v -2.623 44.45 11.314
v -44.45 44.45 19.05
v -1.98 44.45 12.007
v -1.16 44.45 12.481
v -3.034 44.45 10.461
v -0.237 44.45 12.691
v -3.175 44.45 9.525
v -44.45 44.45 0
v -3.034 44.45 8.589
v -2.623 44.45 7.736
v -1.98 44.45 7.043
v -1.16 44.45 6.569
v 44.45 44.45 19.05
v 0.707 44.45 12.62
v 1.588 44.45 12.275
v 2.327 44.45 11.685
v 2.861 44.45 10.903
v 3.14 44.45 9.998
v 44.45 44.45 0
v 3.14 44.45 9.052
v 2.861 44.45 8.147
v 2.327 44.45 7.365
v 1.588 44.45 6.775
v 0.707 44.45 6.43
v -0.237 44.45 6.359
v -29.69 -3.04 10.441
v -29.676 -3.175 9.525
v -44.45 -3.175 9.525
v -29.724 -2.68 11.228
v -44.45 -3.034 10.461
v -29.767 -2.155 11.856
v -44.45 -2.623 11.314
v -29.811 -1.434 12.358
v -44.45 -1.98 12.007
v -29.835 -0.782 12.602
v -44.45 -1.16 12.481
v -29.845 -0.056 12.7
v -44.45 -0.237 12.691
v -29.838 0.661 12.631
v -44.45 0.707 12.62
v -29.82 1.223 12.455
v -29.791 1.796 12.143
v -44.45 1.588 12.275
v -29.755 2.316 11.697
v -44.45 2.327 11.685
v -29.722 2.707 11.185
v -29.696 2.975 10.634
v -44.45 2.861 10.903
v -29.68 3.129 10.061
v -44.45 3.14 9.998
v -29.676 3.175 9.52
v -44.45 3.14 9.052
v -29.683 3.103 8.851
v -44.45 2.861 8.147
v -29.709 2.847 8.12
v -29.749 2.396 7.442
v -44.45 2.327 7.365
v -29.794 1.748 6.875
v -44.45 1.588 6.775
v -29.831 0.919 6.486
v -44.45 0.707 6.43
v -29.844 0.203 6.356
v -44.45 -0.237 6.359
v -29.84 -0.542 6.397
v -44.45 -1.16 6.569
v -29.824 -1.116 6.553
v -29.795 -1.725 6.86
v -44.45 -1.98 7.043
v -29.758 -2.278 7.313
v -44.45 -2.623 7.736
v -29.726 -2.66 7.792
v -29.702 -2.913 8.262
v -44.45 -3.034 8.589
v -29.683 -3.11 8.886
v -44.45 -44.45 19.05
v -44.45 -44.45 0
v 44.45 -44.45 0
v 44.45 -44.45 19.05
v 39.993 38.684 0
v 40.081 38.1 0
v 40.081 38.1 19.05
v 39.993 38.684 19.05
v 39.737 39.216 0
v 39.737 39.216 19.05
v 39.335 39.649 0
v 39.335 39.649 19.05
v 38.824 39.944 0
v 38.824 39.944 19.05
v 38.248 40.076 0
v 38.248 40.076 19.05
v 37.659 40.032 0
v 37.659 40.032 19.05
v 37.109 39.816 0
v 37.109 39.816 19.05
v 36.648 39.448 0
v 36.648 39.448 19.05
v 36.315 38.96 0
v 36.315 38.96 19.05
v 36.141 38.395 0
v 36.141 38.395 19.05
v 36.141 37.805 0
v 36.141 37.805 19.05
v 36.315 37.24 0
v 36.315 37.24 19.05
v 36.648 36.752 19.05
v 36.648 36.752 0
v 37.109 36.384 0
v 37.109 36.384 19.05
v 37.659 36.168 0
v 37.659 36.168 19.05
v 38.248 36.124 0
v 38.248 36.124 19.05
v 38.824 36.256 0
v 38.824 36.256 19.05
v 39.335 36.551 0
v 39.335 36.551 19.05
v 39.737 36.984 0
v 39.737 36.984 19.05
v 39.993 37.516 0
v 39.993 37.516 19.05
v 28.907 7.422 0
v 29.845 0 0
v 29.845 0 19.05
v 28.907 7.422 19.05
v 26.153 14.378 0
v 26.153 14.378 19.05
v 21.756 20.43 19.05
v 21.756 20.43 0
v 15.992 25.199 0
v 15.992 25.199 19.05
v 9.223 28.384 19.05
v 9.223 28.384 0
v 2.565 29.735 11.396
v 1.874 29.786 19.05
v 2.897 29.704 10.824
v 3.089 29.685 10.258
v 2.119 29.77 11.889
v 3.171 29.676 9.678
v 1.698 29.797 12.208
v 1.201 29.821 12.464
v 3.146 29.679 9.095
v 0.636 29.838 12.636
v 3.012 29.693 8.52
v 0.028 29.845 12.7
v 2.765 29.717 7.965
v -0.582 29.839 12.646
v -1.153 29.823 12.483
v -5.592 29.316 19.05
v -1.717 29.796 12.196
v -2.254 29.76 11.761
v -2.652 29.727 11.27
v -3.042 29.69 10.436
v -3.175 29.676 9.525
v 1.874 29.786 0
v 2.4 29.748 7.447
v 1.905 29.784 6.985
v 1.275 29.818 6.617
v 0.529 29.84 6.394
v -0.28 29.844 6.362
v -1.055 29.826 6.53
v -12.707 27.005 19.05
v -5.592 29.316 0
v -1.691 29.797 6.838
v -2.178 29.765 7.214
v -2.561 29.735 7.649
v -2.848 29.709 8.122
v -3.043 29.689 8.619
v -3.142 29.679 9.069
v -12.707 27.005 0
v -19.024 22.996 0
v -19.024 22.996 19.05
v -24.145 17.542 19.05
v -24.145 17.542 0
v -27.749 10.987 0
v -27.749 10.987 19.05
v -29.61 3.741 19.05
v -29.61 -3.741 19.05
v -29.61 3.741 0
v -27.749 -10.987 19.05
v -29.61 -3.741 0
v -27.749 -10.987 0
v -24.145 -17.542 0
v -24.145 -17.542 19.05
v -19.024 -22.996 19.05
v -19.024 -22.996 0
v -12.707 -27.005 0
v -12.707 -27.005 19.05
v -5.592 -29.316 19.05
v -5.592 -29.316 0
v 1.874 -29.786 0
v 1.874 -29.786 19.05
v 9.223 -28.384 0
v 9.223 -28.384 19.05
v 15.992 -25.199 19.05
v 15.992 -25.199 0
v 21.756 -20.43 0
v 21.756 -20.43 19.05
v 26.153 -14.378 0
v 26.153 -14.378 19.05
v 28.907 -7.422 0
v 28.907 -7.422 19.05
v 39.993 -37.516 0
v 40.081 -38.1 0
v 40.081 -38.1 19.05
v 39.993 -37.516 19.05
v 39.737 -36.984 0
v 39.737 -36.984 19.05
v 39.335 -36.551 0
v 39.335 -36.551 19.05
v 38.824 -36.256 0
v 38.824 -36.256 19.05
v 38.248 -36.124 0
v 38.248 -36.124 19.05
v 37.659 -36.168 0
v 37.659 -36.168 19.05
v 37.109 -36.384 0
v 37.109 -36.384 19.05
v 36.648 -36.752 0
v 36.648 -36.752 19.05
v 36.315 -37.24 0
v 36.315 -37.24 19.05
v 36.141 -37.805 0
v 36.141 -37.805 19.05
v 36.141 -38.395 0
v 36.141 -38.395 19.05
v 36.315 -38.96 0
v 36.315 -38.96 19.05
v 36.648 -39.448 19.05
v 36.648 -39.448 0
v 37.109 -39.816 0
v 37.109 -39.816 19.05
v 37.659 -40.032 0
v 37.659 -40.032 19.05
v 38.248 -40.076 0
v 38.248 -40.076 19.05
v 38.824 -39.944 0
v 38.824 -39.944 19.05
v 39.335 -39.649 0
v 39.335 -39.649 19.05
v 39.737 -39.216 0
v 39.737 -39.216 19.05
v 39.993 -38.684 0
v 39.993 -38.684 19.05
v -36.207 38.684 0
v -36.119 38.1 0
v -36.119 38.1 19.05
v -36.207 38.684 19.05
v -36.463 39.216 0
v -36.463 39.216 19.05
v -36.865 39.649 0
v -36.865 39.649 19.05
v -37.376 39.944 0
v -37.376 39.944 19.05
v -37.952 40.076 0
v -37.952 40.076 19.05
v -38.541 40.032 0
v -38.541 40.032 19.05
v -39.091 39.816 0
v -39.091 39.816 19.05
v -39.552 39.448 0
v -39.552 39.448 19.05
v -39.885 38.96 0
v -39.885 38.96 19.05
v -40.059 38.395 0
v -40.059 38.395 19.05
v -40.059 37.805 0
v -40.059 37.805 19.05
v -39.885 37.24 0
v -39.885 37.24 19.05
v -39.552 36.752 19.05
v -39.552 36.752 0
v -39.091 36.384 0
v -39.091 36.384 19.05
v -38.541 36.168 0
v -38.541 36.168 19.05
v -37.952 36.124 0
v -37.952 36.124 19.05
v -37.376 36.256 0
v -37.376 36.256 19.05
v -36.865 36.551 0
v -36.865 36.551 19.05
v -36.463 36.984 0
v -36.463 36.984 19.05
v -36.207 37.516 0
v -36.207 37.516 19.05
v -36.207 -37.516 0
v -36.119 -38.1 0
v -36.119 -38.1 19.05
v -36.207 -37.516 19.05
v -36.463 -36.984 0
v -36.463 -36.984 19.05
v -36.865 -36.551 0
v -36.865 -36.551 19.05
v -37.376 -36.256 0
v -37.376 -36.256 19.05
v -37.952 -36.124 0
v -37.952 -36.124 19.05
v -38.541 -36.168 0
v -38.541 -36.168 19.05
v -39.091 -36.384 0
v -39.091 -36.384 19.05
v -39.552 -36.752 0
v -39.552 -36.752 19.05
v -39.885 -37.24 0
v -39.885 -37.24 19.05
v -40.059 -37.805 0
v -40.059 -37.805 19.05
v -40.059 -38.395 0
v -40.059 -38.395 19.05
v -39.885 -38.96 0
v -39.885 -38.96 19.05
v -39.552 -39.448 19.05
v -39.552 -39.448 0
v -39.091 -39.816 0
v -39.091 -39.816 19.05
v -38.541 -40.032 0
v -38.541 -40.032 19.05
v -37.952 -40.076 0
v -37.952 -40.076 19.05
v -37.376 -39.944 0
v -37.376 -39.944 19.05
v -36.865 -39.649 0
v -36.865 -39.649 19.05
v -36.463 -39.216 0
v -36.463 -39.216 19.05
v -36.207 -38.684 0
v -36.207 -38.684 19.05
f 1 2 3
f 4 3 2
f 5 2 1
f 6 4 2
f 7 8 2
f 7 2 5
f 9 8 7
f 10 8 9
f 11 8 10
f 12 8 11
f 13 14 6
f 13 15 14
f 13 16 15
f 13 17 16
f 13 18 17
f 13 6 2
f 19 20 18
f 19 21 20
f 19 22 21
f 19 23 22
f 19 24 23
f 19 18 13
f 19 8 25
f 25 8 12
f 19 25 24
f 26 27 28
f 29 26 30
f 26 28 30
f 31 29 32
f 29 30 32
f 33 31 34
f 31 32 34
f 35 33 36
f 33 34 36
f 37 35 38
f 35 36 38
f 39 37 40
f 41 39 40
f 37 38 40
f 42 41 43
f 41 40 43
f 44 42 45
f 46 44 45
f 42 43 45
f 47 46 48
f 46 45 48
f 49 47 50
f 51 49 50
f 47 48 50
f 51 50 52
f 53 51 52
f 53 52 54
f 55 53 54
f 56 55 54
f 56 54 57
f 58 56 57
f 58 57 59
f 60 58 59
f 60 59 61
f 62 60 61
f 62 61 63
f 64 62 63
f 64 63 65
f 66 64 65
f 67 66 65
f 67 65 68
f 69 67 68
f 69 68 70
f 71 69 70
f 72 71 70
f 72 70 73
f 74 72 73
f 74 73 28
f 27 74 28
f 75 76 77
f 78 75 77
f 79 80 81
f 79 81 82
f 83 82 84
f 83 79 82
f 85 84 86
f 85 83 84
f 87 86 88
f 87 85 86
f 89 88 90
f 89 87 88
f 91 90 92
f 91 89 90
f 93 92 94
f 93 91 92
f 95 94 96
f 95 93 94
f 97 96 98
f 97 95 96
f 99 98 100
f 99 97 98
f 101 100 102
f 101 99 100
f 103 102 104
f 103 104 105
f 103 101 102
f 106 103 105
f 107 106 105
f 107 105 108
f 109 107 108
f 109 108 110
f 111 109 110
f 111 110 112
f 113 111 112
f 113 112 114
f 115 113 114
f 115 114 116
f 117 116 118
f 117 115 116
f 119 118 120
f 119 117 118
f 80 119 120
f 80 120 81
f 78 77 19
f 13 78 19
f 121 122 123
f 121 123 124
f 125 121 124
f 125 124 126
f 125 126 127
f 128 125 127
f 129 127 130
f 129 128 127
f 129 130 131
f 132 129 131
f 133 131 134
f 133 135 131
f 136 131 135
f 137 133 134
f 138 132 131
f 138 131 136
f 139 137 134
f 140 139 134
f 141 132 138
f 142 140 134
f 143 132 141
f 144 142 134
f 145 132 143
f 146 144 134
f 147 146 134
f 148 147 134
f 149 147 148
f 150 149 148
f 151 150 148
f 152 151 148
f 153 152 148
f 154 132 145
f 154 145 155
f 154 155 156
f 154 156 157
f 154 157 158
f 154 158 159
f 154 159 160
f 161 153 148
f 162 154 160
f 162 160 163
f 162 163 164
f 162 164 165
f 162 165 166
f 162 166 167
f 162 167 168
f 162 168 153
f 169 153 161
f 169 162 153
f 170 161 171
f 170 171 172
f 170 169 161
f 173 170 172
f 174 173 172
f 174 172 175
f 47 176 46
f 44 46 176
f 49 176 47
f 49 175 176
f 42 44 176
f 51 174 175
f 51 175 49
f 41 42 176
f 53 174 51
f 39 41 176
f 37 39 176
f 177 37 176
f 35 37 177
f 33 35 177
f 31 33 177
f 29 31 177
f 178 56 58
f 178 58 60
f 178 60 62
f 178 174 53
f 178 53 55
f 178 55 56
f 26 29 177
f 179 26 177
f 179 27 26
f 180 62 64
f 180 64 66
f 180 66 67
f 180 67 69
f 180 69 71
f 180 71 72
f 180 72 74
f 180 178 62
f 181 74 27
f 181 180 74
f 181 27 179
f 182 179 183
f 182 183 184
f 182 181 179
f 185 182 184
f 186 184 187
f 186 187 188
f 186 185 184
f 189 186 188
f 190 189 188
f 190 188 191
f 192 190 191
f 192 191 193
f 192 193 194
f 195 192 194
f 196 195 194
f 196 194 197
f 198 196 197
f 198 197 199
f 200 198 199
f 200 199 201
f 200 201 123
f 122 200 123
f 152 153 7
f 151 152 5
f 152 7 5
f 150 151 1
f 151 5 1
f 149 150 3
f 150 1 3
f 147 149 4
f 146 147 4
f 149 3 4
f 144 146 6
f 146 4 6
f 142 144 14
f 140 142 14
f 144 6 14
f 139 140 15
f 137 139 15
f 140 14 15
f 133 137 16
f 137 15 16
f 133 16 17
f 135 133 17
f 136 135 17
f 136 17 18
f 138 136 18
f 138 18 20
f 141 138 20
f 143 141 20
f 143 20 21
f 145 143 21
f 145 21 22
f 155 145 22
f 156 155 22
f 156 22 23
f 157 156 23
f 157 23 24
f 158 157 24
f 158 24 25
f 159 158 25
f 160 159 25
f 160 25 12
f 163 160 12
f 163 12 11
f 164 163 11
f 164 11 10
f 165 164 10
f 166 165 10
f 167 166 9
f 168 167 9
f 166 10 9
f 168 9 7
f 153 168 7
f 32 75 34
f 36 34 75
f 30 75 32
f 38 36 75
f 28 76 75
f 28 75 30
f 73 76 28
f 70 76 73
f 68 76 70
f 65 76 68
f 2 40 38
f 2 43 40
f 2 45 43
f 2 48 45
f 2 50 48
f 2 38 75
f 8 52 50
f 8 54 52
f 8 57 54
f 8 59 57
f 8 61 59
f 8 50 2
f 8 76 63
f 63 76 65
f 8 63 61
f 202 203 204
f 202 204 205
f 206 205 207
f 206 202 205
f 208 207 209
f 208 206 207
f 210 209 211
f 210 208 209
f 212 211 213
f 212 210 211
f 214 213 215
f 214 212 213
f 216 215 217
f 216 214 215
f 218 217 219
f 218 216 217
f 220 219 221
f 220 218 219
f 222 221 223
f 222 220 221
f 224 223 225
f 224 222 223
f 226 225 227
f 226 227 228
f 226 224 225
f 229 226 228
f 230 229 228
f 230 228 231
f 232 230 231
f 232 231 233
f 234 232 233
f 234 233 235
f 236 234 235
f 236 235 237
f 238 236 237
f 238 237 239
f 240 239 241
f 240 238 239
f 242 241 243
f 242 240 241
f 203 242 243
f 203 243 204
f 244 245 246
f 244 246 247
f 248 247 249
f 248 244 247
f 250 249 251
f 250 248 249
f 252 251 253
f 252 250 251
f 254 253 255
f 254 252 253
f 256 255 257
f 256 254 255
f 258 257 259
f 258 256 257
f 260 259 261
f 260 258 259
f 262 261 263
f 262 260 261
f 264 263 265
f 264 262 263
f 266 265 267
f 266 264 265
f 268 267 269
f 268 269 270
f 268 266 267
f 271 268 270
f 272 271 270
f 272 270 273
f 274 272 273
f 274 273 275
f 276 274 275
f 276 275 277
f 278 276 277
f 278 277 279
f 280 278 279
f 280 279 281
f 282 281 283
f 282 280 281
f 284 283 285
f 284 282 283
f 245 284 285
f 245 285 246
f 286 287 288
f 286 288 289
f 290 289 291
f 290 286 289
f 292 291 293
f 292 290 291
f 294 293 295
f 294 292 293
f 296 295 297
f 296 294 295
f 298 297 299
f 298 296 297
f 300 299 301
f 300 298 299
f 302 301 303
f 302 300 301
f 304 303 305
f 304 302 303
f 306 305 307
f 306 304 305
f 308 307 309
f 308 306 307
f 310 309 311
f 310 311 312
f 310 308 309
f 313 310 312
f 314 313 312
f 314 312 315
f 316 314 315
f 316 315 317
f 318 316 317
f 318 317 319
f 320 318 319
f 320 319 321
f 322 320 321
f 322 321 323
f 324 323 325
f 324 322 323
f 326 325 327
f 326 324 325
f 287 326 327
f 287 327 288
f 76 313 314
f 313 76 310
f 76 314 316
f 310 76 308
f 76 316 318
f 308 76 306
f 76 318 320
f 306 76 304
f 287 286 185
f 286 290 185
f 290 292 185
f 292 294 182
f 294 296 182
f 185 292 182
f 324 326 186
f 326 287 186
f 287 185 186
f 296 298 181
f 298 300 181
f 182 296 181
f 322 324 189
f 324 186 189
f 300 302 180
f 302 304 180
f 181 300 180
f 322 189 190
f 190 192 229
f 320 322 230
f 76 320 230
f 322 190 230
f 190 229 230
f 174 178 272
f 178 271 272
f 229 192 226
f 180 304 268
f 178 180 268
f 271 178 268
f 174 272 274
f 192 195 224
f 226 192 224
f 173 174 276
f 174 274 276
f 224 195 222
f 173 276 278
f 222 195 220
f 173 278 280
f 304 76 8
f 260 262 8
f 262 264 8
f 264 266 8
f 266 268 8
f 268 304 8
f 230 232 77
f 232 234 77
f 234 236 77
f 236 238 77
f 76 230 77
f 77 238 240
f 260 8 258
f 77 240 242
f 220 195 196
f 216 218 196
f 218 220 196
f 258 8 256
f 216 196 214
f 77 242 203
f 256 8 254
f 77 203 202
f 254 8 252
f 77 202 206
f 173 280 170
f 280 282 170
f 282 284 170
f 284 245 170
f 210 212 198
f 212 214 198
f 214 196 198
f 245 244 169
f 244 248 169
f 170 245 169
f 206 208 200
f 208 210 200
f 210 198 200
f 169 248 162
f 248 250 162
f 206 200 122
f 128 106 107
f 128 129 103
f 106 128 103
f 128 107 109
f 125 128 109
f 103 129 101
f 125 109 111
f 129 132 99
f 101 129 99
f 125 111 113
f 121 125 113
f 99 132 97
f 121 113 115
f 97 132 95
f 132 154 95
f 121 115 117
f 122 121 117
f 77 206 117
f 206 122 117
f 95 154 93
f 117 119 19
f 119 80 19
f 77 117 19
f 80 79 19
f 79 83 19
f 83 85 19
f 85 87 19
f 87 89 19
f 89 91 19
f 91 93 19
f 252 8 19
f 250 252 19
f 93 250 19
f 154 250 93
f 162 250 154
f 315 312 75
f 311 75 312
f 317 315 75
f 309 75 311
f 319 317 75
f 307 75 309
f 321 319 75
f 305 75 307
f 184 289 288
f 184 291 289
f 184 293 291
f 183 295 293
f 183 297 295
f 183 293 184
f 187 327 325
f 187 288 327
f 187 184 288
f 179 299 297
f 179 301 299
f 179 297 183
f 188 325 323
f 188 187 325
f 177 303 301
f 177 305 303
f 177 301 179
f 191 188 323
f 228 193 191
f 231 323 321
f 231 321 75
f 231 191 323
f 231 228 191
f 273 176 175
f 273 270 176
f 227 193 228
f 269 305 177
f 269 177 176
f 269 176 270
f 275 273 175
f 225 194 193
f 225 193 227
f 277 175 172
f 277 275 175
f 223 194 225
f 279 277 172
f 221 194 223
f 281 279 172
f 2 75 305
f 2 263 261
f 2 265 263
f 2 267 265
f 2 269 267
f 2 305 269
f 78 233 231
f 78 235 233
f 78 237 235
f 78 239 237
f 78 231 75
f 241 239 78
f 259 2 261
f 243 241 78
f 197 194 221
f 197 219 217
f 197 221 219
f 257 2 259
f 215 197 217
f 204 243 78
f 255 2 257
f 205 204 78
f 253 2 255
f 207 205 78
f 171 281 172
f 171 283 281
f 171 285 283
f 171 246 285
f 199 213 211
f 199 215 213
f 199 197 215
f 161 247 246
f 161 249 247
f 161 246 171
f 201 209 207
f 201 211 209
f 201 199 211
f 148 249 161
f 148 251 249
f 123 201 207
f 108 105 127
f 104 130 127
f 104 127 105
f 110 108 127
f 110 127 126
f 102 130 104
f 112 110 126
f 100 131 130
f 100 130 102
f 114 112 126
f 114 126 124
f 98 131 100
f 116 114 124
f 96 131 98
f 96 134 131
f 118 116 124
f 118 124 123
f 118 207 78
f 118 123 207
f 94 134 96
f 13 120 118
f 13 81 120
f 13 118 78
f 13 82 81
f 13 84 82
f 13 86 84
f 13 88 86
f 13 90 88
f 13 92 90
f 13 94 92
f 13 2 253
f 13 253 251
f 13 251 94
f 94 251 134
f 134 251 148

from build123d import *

# Parameters (mm, degrees)
F0_W     = 88.9
F0_H     = 88.9
F0_R     = 1.9812
F0_R_2   = 29.845
F1_DEPTH = 19.05
F2_R     = 3.175
F3_DEPTH = 25.4
F4_R     = 3.175
F5_DEPTH = 25.4


with BuildPart() as f1:
    # F0 (on Top) → F1 (new body)
    with BuildSketch(Plane.XY):
        Rectangle(F0_W, F0_H)
        with Locations((-38.1, -38.1)):
            Circle(F0_R, mode=Mode.SUBTRACT)
        with Locations((38.1, -38.1)):
            Circle(F0_R, mode=Mode.SUBTRACT)
        with Locations((-38.1, 38.1)):
            Circle(F0_R, mode=Mode.SUBTRACT)
        Circle(F0_R_2, mode=Mode.SUBTRACT)
        with Locations((38.1, 38.1)):
            Circle(F0_R, mode=Mode.SUBTRACT)
    extrude(amount=F1_DEPTH)

    # F2 (on face) → F3 (cut)
    with BuildSketch(Plane(origin=(0, 44.45, 0), x_dir=(-1, 0, 0), z_dir=(0, 1, 0))):
        with Locations((0, 9.525)):
            Circle(F2_R)
    extrude(amount=-F3_DEPTH, mode=Mode.SUBTRACT)

    # F4 (on face) → F5 (cut)
    with BuildSketch(Plane(origin=(-44.45, 0, 0), x_dir=(0, -1, 0), z_dir=(-1, 0, 0))):
        with Locations((0, 9.525)):
            Circle(F4_R)
    extrude(amount=-F5_DEPTH, mode=Mode.SUBTRACT)


solid = f1.part
